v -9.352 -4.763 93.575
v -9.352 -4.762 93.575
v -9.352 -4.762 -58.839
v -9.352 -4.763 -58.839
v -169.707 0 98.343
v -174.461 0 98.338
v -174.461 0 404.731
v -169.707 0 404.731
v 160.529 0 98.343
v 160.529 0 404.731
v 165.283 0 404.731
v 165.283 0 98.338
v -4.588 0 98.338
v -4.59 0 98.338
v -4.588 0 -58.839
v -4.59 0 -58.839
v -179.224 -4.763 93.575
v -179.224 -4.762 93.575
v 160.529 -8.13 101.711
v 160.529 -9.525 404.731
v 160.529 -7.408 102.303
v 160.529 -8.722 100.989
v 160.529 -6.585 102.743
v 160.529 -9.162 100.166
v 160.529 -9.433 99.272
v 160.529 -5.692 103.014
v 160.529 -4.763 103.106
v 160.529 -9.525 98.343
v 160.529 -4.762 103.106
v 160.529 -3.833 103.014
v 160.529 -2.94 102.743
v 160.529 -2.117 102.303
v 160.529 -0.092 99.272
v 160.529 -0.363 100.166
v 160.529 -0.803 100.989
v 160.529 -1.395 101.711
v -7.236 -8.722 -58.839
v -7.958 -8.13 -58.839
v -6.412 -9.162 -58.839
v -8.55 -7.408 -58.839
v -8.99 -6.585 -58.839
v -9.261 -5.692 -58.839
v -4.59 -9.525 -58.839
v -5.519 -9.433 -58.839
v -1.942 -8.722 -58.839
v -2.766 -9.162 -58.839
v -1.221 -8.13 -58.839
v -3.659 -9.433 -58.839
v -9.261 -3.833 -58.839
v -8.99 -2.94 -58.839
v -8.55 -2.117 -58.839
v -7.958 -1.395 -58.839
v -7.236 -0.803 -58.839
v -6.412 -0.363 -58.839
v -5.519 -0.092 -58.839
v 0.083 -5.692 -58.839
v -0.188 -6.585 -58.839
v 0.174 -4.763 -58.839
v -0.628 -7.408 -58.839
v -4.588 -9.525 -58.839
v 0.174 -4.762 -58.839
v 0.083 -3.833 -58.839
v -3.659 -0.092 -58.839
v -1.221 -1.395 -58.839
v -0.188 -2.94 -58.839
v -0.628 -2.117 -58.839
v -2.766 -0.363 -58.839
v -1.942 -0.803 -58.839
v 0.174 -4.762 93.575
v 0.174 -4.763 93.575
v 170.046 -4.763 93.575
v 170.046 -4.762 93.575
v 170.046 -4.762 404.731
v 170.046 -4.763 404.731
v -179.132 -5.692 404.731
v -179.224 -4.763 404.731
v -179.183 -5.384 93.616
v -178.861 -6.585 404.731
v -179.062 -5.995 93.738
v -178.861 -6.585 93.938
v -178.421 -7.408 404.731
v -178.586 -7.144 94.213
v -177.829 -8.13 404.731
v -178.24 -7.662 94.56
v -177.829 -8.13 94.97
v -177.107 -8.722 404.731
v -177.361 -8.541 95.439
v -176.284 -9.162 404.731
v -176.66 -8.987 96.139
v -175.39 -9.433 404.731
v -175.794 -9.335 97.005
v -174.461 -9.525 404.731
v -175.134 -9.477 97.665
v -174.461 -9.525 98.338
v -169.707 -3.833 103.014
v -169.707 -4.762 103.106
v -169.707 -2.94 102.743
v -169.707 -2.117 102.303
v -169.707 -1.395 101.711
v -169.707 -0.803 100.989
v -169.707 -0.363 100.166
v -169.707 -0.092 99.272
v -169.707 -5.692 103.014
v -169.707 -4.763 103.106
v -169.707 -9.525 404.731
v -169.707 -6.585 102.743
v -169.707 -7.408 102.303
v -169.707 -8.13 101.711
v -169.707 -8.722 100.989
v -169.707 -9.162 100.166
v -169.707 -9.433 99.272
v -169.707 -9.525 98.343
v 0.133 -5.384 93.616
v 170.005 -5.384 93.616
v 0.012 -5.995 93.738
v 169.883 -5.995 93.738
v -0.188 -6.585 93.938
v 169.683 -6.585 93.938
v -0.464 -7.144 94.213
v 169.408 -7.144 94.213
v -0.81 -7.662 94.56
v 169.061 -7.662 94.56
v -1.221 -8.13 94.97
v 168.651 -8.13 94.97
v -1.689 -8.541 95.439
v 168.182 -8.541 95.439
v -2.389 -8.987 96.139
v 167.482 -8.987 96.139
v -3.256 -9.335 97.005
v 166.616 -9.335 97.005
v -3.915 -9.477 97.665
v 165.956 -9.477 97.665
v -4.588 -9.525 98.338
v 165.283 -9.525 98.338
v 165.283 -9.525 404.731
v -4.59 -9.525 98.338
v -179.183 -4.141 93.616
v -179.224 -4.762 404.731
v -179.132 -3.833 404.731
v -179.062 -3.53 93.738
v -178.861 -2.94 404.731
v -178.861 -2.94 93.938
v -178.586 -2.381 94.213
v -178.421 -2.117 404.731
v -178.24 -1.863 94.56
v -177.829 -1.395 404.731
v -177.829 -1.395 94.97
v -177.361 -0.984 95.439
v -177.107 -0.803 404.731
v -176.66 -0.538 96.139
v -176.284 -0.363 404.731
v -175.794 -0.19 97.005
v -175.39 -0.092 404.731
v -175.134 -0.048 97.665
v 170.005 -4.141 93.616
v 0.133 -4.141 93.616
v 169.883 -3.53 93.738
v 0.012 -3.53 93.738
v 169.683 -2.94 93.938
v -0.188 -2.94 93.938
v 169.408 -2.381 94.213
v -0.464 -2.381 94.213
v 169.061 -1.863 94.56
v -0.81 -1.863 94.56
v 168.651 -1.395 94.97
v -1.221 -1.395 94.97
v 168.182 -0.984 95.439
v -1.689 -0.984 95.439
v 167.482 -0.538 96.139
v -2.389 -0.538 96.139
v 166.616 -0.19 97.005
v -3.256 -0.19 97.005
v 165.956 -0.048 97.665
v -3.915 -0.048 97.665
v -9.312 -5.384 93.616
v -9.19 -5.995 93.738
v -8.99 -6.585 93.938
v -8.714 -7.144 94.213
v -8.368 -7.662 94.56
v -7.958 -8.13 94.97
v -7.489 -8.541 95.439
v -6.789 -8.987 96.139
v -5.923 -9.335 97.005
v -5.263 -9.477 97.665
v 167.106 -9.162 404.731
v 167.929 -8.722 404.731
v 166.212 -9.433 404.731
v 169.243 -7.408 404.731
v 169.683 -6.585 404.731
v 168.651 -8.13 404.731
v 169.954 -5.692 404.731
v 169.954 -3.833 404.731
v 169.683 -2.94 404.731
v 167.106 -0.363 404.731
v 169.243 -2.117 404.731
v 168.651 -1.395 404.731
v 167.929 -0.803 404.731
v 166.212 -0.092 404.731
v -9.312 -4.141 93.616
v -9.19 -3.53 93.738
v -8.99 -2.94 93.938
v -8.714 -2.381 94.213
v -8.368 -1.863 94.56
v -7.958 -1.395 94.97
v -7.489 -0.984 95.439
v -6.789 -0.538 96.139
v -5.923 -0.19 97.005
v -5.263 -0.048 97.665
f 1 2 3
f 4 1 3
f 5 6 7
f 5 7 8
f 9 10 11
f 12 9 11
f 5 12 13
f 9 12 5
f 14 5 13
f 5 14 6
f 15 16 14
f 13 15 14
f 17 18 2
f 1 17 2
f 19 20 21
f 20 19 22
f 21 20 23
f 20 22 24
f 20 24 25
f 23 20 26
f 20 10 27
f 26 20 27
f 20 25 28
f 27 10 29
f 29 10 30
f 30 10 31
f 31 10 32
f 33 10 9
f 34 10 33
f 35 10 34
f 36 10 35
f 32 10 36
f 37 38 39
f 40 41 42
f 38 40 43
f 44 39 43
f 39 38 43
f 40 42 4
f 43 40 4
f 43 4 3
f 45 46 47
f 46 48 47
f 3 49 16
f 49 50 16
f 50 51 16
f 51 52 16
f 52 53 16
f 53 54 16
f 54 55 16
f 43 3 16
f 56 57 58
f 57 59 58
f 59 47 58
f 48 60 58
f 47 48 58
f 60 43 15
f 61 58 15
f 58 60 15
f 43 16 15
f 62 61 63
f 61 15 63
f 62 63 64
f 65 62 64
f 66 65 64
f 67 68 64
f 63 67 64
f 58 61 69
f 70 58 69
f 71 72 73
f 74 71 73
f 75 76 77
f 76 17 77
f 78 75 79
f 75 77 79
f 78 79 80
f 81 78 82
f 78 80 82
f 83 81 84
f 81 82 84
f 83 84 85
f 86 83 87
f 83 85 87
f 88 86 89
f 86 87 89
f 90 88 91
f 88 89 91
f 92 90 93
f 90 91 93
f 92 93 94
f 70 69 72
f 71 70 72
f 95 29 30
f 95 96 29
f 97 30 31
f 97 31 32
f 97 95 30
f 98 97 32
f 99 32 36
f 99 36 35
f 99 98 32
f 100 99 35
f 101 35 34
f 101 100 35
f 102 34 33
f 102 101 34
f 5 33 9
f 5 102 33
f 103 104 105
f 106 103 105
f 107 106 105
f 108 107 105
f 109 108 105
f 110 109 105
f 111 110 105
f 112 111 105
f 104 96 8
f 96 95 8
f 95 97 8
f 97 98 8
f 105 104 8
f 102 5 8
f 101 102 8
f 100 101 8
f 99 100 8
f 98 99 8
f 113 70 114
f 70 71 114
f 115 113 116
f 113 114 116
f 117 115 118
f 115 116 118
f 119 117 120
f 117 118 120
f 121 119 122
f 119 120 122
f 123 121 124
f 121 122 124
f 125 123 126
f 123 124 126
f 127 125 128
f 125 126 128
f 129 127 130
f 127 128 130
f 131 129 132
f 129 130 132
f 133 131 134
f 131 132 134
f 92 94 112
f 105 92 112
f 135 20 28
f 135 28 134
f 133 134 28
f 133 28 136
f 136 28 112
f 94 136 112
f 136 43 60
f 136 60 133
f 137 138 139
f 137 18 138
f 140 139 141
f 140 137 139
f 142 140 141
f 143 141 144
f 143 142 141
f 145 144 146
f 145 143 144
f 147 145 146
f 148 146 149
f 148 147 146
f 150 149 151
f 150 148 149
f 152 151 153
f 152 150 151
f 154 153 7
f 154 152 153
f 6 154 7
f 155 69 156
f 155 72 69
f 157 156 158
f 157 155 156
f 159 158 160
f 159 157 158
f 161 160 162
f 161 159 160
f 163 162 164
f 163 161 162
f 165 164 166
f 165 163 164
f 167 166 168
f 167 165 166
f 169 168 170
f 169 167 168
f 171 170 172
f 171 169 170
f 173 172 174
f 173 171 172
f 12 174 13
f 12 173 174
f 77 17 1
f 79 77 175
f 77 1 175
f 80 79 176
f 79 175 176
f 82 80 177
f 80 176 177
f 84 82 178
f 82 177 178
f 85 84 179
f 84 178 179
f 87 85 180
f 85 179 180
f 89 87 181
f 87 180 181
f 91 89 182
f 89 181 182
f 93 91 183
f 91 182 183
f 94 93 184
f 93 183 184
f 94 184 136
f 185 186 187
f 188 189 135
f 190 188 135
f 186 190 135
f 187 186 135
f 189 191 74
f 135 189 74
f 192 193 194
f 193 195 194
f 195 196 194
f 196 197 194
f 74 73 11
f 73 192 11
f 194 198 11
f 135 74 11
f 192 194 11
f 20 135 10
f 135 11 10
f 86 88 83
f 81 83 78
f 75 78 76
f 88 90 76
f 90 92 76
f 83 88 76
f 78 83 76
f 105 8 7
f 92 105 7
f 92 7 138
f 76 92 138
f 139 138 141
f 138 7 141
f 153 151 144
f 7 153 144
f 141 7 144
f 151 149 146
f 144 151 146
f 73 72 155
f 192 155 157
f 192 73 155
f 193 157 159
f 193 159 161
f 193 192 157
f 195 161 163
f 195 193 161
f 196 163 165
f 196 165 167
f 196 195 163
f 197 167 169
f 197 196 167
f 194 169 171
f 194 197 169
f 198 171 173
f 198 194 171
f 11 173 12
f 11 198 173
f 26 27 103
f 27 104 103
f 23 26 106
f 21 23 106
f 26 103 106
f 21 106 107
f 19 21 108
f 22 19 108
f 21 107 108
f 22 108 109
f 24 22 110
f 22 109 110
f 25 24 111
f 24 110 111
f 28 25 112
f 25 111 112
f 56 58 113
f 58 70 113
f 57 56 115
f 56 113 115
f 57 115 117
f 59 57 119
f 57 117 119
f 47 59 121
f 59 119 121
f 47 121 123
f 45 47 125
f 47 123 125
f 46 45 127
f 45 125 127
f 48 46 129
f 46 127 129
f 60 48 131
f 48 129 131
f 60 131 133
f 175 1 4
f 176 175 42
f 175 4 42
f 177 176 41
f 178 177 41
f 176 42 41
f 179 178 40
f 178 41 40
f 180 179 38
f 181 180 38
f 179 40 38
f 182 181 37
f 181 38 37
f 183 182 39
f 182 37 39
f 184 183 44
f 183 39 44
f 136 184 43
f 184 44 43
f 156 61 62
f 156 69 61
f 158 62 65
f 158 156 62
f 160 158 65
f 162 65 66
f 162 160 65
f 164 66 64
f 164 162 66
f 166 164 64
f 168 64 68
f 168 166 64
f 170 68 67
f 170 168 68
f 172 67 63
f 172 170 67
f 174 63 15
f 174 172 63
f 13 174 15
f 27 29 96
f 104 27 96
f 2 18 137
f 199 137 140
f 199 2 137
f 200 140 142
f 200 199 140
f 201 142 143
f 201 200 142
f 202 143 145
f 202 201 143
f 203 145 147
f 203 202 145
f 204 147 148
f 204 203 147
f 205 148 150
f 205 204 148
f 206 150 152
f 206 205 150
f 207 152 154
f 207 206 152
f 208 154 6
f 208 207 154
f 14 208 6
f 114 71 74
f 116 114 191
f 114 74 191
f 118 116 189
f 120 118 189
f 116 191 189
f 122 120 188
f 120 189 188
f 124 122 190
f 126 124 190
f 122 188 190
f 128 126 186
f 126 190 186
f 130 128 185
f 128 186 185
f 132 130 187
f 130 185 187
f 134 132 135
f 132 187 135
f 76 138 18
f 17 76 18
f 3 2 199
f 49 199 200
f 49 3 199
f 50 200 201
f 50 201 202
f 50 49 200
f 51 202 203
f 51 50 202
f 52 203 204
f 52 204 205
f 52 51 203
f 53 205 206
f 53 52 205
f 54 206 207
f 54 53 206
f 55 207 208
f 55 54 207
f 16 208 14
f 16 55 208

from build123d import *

# Parameters (mm, degrees)
F1_DEPTH = 9.525
F2_R     = 4.76249


# Not quite as in the source:
# - a fillet or chamfer is up to 0.001 mm smaller than in the source, because OpenCascade refuses the exact size


with BuildPart() as f1:
    # F0 (on Front) → F1 (new body)
    with BuildSketch(Plane.XZ):
        Polygon((-9.3524411189, 93.575365177), (-9.3524411189, -58.8385015355), (-4.5891202249, -58.8385015355), (0.174200669, -58.8385015355), (0.174200669, 93.575365177), (170.0456099196, 93.575365177), (170.0456099196, 404.7306356684), (160.5287608864, 404.7306356684), (160.5287608864, 103.1056356684), (-4.5891202249, 103.1056356684), (-169.7070013363, 103.1056356684), (-169.7070013363, 404.7306356684), (-179.2238503695, 404.7306356684), (-179.2238503695, 93.575365177), align=None)
    extrude(amount=F1_DEPTH)

    # F2 (radius 4.7625 in the source; OpenCascade refuses exactly that, so slightly less here)
    f2_edges = [f1.edges().sort_by_distance(p)[0] for p in [
        (170.04561, -9.525, 249.153),
        (170.04561, 0, 249.153),
        (-4.58912, 0, 103.105636),
        (-4.58912, -9.525, 103.105636),
        (-94.288146, -9.525, 93.575365),
        (-94.288146, 0, 93.575365),
        (85.109905, -9.525, 93.575365),
        (85.109905, 0, 93.575365),
        (0.174201, -9.525, 17.368432),
        (-9.352441, -9.525, 17.368432),
        (-9.352441, 0, 17.368432),
        (0.174201, 0, 17.368432),
        (-179.22385, 0, 249.153),
        (-179.22385, -9.525, 249.153),
    ]]
    fillet(f2_edges, radius=F2_R)


solid = f1.part
